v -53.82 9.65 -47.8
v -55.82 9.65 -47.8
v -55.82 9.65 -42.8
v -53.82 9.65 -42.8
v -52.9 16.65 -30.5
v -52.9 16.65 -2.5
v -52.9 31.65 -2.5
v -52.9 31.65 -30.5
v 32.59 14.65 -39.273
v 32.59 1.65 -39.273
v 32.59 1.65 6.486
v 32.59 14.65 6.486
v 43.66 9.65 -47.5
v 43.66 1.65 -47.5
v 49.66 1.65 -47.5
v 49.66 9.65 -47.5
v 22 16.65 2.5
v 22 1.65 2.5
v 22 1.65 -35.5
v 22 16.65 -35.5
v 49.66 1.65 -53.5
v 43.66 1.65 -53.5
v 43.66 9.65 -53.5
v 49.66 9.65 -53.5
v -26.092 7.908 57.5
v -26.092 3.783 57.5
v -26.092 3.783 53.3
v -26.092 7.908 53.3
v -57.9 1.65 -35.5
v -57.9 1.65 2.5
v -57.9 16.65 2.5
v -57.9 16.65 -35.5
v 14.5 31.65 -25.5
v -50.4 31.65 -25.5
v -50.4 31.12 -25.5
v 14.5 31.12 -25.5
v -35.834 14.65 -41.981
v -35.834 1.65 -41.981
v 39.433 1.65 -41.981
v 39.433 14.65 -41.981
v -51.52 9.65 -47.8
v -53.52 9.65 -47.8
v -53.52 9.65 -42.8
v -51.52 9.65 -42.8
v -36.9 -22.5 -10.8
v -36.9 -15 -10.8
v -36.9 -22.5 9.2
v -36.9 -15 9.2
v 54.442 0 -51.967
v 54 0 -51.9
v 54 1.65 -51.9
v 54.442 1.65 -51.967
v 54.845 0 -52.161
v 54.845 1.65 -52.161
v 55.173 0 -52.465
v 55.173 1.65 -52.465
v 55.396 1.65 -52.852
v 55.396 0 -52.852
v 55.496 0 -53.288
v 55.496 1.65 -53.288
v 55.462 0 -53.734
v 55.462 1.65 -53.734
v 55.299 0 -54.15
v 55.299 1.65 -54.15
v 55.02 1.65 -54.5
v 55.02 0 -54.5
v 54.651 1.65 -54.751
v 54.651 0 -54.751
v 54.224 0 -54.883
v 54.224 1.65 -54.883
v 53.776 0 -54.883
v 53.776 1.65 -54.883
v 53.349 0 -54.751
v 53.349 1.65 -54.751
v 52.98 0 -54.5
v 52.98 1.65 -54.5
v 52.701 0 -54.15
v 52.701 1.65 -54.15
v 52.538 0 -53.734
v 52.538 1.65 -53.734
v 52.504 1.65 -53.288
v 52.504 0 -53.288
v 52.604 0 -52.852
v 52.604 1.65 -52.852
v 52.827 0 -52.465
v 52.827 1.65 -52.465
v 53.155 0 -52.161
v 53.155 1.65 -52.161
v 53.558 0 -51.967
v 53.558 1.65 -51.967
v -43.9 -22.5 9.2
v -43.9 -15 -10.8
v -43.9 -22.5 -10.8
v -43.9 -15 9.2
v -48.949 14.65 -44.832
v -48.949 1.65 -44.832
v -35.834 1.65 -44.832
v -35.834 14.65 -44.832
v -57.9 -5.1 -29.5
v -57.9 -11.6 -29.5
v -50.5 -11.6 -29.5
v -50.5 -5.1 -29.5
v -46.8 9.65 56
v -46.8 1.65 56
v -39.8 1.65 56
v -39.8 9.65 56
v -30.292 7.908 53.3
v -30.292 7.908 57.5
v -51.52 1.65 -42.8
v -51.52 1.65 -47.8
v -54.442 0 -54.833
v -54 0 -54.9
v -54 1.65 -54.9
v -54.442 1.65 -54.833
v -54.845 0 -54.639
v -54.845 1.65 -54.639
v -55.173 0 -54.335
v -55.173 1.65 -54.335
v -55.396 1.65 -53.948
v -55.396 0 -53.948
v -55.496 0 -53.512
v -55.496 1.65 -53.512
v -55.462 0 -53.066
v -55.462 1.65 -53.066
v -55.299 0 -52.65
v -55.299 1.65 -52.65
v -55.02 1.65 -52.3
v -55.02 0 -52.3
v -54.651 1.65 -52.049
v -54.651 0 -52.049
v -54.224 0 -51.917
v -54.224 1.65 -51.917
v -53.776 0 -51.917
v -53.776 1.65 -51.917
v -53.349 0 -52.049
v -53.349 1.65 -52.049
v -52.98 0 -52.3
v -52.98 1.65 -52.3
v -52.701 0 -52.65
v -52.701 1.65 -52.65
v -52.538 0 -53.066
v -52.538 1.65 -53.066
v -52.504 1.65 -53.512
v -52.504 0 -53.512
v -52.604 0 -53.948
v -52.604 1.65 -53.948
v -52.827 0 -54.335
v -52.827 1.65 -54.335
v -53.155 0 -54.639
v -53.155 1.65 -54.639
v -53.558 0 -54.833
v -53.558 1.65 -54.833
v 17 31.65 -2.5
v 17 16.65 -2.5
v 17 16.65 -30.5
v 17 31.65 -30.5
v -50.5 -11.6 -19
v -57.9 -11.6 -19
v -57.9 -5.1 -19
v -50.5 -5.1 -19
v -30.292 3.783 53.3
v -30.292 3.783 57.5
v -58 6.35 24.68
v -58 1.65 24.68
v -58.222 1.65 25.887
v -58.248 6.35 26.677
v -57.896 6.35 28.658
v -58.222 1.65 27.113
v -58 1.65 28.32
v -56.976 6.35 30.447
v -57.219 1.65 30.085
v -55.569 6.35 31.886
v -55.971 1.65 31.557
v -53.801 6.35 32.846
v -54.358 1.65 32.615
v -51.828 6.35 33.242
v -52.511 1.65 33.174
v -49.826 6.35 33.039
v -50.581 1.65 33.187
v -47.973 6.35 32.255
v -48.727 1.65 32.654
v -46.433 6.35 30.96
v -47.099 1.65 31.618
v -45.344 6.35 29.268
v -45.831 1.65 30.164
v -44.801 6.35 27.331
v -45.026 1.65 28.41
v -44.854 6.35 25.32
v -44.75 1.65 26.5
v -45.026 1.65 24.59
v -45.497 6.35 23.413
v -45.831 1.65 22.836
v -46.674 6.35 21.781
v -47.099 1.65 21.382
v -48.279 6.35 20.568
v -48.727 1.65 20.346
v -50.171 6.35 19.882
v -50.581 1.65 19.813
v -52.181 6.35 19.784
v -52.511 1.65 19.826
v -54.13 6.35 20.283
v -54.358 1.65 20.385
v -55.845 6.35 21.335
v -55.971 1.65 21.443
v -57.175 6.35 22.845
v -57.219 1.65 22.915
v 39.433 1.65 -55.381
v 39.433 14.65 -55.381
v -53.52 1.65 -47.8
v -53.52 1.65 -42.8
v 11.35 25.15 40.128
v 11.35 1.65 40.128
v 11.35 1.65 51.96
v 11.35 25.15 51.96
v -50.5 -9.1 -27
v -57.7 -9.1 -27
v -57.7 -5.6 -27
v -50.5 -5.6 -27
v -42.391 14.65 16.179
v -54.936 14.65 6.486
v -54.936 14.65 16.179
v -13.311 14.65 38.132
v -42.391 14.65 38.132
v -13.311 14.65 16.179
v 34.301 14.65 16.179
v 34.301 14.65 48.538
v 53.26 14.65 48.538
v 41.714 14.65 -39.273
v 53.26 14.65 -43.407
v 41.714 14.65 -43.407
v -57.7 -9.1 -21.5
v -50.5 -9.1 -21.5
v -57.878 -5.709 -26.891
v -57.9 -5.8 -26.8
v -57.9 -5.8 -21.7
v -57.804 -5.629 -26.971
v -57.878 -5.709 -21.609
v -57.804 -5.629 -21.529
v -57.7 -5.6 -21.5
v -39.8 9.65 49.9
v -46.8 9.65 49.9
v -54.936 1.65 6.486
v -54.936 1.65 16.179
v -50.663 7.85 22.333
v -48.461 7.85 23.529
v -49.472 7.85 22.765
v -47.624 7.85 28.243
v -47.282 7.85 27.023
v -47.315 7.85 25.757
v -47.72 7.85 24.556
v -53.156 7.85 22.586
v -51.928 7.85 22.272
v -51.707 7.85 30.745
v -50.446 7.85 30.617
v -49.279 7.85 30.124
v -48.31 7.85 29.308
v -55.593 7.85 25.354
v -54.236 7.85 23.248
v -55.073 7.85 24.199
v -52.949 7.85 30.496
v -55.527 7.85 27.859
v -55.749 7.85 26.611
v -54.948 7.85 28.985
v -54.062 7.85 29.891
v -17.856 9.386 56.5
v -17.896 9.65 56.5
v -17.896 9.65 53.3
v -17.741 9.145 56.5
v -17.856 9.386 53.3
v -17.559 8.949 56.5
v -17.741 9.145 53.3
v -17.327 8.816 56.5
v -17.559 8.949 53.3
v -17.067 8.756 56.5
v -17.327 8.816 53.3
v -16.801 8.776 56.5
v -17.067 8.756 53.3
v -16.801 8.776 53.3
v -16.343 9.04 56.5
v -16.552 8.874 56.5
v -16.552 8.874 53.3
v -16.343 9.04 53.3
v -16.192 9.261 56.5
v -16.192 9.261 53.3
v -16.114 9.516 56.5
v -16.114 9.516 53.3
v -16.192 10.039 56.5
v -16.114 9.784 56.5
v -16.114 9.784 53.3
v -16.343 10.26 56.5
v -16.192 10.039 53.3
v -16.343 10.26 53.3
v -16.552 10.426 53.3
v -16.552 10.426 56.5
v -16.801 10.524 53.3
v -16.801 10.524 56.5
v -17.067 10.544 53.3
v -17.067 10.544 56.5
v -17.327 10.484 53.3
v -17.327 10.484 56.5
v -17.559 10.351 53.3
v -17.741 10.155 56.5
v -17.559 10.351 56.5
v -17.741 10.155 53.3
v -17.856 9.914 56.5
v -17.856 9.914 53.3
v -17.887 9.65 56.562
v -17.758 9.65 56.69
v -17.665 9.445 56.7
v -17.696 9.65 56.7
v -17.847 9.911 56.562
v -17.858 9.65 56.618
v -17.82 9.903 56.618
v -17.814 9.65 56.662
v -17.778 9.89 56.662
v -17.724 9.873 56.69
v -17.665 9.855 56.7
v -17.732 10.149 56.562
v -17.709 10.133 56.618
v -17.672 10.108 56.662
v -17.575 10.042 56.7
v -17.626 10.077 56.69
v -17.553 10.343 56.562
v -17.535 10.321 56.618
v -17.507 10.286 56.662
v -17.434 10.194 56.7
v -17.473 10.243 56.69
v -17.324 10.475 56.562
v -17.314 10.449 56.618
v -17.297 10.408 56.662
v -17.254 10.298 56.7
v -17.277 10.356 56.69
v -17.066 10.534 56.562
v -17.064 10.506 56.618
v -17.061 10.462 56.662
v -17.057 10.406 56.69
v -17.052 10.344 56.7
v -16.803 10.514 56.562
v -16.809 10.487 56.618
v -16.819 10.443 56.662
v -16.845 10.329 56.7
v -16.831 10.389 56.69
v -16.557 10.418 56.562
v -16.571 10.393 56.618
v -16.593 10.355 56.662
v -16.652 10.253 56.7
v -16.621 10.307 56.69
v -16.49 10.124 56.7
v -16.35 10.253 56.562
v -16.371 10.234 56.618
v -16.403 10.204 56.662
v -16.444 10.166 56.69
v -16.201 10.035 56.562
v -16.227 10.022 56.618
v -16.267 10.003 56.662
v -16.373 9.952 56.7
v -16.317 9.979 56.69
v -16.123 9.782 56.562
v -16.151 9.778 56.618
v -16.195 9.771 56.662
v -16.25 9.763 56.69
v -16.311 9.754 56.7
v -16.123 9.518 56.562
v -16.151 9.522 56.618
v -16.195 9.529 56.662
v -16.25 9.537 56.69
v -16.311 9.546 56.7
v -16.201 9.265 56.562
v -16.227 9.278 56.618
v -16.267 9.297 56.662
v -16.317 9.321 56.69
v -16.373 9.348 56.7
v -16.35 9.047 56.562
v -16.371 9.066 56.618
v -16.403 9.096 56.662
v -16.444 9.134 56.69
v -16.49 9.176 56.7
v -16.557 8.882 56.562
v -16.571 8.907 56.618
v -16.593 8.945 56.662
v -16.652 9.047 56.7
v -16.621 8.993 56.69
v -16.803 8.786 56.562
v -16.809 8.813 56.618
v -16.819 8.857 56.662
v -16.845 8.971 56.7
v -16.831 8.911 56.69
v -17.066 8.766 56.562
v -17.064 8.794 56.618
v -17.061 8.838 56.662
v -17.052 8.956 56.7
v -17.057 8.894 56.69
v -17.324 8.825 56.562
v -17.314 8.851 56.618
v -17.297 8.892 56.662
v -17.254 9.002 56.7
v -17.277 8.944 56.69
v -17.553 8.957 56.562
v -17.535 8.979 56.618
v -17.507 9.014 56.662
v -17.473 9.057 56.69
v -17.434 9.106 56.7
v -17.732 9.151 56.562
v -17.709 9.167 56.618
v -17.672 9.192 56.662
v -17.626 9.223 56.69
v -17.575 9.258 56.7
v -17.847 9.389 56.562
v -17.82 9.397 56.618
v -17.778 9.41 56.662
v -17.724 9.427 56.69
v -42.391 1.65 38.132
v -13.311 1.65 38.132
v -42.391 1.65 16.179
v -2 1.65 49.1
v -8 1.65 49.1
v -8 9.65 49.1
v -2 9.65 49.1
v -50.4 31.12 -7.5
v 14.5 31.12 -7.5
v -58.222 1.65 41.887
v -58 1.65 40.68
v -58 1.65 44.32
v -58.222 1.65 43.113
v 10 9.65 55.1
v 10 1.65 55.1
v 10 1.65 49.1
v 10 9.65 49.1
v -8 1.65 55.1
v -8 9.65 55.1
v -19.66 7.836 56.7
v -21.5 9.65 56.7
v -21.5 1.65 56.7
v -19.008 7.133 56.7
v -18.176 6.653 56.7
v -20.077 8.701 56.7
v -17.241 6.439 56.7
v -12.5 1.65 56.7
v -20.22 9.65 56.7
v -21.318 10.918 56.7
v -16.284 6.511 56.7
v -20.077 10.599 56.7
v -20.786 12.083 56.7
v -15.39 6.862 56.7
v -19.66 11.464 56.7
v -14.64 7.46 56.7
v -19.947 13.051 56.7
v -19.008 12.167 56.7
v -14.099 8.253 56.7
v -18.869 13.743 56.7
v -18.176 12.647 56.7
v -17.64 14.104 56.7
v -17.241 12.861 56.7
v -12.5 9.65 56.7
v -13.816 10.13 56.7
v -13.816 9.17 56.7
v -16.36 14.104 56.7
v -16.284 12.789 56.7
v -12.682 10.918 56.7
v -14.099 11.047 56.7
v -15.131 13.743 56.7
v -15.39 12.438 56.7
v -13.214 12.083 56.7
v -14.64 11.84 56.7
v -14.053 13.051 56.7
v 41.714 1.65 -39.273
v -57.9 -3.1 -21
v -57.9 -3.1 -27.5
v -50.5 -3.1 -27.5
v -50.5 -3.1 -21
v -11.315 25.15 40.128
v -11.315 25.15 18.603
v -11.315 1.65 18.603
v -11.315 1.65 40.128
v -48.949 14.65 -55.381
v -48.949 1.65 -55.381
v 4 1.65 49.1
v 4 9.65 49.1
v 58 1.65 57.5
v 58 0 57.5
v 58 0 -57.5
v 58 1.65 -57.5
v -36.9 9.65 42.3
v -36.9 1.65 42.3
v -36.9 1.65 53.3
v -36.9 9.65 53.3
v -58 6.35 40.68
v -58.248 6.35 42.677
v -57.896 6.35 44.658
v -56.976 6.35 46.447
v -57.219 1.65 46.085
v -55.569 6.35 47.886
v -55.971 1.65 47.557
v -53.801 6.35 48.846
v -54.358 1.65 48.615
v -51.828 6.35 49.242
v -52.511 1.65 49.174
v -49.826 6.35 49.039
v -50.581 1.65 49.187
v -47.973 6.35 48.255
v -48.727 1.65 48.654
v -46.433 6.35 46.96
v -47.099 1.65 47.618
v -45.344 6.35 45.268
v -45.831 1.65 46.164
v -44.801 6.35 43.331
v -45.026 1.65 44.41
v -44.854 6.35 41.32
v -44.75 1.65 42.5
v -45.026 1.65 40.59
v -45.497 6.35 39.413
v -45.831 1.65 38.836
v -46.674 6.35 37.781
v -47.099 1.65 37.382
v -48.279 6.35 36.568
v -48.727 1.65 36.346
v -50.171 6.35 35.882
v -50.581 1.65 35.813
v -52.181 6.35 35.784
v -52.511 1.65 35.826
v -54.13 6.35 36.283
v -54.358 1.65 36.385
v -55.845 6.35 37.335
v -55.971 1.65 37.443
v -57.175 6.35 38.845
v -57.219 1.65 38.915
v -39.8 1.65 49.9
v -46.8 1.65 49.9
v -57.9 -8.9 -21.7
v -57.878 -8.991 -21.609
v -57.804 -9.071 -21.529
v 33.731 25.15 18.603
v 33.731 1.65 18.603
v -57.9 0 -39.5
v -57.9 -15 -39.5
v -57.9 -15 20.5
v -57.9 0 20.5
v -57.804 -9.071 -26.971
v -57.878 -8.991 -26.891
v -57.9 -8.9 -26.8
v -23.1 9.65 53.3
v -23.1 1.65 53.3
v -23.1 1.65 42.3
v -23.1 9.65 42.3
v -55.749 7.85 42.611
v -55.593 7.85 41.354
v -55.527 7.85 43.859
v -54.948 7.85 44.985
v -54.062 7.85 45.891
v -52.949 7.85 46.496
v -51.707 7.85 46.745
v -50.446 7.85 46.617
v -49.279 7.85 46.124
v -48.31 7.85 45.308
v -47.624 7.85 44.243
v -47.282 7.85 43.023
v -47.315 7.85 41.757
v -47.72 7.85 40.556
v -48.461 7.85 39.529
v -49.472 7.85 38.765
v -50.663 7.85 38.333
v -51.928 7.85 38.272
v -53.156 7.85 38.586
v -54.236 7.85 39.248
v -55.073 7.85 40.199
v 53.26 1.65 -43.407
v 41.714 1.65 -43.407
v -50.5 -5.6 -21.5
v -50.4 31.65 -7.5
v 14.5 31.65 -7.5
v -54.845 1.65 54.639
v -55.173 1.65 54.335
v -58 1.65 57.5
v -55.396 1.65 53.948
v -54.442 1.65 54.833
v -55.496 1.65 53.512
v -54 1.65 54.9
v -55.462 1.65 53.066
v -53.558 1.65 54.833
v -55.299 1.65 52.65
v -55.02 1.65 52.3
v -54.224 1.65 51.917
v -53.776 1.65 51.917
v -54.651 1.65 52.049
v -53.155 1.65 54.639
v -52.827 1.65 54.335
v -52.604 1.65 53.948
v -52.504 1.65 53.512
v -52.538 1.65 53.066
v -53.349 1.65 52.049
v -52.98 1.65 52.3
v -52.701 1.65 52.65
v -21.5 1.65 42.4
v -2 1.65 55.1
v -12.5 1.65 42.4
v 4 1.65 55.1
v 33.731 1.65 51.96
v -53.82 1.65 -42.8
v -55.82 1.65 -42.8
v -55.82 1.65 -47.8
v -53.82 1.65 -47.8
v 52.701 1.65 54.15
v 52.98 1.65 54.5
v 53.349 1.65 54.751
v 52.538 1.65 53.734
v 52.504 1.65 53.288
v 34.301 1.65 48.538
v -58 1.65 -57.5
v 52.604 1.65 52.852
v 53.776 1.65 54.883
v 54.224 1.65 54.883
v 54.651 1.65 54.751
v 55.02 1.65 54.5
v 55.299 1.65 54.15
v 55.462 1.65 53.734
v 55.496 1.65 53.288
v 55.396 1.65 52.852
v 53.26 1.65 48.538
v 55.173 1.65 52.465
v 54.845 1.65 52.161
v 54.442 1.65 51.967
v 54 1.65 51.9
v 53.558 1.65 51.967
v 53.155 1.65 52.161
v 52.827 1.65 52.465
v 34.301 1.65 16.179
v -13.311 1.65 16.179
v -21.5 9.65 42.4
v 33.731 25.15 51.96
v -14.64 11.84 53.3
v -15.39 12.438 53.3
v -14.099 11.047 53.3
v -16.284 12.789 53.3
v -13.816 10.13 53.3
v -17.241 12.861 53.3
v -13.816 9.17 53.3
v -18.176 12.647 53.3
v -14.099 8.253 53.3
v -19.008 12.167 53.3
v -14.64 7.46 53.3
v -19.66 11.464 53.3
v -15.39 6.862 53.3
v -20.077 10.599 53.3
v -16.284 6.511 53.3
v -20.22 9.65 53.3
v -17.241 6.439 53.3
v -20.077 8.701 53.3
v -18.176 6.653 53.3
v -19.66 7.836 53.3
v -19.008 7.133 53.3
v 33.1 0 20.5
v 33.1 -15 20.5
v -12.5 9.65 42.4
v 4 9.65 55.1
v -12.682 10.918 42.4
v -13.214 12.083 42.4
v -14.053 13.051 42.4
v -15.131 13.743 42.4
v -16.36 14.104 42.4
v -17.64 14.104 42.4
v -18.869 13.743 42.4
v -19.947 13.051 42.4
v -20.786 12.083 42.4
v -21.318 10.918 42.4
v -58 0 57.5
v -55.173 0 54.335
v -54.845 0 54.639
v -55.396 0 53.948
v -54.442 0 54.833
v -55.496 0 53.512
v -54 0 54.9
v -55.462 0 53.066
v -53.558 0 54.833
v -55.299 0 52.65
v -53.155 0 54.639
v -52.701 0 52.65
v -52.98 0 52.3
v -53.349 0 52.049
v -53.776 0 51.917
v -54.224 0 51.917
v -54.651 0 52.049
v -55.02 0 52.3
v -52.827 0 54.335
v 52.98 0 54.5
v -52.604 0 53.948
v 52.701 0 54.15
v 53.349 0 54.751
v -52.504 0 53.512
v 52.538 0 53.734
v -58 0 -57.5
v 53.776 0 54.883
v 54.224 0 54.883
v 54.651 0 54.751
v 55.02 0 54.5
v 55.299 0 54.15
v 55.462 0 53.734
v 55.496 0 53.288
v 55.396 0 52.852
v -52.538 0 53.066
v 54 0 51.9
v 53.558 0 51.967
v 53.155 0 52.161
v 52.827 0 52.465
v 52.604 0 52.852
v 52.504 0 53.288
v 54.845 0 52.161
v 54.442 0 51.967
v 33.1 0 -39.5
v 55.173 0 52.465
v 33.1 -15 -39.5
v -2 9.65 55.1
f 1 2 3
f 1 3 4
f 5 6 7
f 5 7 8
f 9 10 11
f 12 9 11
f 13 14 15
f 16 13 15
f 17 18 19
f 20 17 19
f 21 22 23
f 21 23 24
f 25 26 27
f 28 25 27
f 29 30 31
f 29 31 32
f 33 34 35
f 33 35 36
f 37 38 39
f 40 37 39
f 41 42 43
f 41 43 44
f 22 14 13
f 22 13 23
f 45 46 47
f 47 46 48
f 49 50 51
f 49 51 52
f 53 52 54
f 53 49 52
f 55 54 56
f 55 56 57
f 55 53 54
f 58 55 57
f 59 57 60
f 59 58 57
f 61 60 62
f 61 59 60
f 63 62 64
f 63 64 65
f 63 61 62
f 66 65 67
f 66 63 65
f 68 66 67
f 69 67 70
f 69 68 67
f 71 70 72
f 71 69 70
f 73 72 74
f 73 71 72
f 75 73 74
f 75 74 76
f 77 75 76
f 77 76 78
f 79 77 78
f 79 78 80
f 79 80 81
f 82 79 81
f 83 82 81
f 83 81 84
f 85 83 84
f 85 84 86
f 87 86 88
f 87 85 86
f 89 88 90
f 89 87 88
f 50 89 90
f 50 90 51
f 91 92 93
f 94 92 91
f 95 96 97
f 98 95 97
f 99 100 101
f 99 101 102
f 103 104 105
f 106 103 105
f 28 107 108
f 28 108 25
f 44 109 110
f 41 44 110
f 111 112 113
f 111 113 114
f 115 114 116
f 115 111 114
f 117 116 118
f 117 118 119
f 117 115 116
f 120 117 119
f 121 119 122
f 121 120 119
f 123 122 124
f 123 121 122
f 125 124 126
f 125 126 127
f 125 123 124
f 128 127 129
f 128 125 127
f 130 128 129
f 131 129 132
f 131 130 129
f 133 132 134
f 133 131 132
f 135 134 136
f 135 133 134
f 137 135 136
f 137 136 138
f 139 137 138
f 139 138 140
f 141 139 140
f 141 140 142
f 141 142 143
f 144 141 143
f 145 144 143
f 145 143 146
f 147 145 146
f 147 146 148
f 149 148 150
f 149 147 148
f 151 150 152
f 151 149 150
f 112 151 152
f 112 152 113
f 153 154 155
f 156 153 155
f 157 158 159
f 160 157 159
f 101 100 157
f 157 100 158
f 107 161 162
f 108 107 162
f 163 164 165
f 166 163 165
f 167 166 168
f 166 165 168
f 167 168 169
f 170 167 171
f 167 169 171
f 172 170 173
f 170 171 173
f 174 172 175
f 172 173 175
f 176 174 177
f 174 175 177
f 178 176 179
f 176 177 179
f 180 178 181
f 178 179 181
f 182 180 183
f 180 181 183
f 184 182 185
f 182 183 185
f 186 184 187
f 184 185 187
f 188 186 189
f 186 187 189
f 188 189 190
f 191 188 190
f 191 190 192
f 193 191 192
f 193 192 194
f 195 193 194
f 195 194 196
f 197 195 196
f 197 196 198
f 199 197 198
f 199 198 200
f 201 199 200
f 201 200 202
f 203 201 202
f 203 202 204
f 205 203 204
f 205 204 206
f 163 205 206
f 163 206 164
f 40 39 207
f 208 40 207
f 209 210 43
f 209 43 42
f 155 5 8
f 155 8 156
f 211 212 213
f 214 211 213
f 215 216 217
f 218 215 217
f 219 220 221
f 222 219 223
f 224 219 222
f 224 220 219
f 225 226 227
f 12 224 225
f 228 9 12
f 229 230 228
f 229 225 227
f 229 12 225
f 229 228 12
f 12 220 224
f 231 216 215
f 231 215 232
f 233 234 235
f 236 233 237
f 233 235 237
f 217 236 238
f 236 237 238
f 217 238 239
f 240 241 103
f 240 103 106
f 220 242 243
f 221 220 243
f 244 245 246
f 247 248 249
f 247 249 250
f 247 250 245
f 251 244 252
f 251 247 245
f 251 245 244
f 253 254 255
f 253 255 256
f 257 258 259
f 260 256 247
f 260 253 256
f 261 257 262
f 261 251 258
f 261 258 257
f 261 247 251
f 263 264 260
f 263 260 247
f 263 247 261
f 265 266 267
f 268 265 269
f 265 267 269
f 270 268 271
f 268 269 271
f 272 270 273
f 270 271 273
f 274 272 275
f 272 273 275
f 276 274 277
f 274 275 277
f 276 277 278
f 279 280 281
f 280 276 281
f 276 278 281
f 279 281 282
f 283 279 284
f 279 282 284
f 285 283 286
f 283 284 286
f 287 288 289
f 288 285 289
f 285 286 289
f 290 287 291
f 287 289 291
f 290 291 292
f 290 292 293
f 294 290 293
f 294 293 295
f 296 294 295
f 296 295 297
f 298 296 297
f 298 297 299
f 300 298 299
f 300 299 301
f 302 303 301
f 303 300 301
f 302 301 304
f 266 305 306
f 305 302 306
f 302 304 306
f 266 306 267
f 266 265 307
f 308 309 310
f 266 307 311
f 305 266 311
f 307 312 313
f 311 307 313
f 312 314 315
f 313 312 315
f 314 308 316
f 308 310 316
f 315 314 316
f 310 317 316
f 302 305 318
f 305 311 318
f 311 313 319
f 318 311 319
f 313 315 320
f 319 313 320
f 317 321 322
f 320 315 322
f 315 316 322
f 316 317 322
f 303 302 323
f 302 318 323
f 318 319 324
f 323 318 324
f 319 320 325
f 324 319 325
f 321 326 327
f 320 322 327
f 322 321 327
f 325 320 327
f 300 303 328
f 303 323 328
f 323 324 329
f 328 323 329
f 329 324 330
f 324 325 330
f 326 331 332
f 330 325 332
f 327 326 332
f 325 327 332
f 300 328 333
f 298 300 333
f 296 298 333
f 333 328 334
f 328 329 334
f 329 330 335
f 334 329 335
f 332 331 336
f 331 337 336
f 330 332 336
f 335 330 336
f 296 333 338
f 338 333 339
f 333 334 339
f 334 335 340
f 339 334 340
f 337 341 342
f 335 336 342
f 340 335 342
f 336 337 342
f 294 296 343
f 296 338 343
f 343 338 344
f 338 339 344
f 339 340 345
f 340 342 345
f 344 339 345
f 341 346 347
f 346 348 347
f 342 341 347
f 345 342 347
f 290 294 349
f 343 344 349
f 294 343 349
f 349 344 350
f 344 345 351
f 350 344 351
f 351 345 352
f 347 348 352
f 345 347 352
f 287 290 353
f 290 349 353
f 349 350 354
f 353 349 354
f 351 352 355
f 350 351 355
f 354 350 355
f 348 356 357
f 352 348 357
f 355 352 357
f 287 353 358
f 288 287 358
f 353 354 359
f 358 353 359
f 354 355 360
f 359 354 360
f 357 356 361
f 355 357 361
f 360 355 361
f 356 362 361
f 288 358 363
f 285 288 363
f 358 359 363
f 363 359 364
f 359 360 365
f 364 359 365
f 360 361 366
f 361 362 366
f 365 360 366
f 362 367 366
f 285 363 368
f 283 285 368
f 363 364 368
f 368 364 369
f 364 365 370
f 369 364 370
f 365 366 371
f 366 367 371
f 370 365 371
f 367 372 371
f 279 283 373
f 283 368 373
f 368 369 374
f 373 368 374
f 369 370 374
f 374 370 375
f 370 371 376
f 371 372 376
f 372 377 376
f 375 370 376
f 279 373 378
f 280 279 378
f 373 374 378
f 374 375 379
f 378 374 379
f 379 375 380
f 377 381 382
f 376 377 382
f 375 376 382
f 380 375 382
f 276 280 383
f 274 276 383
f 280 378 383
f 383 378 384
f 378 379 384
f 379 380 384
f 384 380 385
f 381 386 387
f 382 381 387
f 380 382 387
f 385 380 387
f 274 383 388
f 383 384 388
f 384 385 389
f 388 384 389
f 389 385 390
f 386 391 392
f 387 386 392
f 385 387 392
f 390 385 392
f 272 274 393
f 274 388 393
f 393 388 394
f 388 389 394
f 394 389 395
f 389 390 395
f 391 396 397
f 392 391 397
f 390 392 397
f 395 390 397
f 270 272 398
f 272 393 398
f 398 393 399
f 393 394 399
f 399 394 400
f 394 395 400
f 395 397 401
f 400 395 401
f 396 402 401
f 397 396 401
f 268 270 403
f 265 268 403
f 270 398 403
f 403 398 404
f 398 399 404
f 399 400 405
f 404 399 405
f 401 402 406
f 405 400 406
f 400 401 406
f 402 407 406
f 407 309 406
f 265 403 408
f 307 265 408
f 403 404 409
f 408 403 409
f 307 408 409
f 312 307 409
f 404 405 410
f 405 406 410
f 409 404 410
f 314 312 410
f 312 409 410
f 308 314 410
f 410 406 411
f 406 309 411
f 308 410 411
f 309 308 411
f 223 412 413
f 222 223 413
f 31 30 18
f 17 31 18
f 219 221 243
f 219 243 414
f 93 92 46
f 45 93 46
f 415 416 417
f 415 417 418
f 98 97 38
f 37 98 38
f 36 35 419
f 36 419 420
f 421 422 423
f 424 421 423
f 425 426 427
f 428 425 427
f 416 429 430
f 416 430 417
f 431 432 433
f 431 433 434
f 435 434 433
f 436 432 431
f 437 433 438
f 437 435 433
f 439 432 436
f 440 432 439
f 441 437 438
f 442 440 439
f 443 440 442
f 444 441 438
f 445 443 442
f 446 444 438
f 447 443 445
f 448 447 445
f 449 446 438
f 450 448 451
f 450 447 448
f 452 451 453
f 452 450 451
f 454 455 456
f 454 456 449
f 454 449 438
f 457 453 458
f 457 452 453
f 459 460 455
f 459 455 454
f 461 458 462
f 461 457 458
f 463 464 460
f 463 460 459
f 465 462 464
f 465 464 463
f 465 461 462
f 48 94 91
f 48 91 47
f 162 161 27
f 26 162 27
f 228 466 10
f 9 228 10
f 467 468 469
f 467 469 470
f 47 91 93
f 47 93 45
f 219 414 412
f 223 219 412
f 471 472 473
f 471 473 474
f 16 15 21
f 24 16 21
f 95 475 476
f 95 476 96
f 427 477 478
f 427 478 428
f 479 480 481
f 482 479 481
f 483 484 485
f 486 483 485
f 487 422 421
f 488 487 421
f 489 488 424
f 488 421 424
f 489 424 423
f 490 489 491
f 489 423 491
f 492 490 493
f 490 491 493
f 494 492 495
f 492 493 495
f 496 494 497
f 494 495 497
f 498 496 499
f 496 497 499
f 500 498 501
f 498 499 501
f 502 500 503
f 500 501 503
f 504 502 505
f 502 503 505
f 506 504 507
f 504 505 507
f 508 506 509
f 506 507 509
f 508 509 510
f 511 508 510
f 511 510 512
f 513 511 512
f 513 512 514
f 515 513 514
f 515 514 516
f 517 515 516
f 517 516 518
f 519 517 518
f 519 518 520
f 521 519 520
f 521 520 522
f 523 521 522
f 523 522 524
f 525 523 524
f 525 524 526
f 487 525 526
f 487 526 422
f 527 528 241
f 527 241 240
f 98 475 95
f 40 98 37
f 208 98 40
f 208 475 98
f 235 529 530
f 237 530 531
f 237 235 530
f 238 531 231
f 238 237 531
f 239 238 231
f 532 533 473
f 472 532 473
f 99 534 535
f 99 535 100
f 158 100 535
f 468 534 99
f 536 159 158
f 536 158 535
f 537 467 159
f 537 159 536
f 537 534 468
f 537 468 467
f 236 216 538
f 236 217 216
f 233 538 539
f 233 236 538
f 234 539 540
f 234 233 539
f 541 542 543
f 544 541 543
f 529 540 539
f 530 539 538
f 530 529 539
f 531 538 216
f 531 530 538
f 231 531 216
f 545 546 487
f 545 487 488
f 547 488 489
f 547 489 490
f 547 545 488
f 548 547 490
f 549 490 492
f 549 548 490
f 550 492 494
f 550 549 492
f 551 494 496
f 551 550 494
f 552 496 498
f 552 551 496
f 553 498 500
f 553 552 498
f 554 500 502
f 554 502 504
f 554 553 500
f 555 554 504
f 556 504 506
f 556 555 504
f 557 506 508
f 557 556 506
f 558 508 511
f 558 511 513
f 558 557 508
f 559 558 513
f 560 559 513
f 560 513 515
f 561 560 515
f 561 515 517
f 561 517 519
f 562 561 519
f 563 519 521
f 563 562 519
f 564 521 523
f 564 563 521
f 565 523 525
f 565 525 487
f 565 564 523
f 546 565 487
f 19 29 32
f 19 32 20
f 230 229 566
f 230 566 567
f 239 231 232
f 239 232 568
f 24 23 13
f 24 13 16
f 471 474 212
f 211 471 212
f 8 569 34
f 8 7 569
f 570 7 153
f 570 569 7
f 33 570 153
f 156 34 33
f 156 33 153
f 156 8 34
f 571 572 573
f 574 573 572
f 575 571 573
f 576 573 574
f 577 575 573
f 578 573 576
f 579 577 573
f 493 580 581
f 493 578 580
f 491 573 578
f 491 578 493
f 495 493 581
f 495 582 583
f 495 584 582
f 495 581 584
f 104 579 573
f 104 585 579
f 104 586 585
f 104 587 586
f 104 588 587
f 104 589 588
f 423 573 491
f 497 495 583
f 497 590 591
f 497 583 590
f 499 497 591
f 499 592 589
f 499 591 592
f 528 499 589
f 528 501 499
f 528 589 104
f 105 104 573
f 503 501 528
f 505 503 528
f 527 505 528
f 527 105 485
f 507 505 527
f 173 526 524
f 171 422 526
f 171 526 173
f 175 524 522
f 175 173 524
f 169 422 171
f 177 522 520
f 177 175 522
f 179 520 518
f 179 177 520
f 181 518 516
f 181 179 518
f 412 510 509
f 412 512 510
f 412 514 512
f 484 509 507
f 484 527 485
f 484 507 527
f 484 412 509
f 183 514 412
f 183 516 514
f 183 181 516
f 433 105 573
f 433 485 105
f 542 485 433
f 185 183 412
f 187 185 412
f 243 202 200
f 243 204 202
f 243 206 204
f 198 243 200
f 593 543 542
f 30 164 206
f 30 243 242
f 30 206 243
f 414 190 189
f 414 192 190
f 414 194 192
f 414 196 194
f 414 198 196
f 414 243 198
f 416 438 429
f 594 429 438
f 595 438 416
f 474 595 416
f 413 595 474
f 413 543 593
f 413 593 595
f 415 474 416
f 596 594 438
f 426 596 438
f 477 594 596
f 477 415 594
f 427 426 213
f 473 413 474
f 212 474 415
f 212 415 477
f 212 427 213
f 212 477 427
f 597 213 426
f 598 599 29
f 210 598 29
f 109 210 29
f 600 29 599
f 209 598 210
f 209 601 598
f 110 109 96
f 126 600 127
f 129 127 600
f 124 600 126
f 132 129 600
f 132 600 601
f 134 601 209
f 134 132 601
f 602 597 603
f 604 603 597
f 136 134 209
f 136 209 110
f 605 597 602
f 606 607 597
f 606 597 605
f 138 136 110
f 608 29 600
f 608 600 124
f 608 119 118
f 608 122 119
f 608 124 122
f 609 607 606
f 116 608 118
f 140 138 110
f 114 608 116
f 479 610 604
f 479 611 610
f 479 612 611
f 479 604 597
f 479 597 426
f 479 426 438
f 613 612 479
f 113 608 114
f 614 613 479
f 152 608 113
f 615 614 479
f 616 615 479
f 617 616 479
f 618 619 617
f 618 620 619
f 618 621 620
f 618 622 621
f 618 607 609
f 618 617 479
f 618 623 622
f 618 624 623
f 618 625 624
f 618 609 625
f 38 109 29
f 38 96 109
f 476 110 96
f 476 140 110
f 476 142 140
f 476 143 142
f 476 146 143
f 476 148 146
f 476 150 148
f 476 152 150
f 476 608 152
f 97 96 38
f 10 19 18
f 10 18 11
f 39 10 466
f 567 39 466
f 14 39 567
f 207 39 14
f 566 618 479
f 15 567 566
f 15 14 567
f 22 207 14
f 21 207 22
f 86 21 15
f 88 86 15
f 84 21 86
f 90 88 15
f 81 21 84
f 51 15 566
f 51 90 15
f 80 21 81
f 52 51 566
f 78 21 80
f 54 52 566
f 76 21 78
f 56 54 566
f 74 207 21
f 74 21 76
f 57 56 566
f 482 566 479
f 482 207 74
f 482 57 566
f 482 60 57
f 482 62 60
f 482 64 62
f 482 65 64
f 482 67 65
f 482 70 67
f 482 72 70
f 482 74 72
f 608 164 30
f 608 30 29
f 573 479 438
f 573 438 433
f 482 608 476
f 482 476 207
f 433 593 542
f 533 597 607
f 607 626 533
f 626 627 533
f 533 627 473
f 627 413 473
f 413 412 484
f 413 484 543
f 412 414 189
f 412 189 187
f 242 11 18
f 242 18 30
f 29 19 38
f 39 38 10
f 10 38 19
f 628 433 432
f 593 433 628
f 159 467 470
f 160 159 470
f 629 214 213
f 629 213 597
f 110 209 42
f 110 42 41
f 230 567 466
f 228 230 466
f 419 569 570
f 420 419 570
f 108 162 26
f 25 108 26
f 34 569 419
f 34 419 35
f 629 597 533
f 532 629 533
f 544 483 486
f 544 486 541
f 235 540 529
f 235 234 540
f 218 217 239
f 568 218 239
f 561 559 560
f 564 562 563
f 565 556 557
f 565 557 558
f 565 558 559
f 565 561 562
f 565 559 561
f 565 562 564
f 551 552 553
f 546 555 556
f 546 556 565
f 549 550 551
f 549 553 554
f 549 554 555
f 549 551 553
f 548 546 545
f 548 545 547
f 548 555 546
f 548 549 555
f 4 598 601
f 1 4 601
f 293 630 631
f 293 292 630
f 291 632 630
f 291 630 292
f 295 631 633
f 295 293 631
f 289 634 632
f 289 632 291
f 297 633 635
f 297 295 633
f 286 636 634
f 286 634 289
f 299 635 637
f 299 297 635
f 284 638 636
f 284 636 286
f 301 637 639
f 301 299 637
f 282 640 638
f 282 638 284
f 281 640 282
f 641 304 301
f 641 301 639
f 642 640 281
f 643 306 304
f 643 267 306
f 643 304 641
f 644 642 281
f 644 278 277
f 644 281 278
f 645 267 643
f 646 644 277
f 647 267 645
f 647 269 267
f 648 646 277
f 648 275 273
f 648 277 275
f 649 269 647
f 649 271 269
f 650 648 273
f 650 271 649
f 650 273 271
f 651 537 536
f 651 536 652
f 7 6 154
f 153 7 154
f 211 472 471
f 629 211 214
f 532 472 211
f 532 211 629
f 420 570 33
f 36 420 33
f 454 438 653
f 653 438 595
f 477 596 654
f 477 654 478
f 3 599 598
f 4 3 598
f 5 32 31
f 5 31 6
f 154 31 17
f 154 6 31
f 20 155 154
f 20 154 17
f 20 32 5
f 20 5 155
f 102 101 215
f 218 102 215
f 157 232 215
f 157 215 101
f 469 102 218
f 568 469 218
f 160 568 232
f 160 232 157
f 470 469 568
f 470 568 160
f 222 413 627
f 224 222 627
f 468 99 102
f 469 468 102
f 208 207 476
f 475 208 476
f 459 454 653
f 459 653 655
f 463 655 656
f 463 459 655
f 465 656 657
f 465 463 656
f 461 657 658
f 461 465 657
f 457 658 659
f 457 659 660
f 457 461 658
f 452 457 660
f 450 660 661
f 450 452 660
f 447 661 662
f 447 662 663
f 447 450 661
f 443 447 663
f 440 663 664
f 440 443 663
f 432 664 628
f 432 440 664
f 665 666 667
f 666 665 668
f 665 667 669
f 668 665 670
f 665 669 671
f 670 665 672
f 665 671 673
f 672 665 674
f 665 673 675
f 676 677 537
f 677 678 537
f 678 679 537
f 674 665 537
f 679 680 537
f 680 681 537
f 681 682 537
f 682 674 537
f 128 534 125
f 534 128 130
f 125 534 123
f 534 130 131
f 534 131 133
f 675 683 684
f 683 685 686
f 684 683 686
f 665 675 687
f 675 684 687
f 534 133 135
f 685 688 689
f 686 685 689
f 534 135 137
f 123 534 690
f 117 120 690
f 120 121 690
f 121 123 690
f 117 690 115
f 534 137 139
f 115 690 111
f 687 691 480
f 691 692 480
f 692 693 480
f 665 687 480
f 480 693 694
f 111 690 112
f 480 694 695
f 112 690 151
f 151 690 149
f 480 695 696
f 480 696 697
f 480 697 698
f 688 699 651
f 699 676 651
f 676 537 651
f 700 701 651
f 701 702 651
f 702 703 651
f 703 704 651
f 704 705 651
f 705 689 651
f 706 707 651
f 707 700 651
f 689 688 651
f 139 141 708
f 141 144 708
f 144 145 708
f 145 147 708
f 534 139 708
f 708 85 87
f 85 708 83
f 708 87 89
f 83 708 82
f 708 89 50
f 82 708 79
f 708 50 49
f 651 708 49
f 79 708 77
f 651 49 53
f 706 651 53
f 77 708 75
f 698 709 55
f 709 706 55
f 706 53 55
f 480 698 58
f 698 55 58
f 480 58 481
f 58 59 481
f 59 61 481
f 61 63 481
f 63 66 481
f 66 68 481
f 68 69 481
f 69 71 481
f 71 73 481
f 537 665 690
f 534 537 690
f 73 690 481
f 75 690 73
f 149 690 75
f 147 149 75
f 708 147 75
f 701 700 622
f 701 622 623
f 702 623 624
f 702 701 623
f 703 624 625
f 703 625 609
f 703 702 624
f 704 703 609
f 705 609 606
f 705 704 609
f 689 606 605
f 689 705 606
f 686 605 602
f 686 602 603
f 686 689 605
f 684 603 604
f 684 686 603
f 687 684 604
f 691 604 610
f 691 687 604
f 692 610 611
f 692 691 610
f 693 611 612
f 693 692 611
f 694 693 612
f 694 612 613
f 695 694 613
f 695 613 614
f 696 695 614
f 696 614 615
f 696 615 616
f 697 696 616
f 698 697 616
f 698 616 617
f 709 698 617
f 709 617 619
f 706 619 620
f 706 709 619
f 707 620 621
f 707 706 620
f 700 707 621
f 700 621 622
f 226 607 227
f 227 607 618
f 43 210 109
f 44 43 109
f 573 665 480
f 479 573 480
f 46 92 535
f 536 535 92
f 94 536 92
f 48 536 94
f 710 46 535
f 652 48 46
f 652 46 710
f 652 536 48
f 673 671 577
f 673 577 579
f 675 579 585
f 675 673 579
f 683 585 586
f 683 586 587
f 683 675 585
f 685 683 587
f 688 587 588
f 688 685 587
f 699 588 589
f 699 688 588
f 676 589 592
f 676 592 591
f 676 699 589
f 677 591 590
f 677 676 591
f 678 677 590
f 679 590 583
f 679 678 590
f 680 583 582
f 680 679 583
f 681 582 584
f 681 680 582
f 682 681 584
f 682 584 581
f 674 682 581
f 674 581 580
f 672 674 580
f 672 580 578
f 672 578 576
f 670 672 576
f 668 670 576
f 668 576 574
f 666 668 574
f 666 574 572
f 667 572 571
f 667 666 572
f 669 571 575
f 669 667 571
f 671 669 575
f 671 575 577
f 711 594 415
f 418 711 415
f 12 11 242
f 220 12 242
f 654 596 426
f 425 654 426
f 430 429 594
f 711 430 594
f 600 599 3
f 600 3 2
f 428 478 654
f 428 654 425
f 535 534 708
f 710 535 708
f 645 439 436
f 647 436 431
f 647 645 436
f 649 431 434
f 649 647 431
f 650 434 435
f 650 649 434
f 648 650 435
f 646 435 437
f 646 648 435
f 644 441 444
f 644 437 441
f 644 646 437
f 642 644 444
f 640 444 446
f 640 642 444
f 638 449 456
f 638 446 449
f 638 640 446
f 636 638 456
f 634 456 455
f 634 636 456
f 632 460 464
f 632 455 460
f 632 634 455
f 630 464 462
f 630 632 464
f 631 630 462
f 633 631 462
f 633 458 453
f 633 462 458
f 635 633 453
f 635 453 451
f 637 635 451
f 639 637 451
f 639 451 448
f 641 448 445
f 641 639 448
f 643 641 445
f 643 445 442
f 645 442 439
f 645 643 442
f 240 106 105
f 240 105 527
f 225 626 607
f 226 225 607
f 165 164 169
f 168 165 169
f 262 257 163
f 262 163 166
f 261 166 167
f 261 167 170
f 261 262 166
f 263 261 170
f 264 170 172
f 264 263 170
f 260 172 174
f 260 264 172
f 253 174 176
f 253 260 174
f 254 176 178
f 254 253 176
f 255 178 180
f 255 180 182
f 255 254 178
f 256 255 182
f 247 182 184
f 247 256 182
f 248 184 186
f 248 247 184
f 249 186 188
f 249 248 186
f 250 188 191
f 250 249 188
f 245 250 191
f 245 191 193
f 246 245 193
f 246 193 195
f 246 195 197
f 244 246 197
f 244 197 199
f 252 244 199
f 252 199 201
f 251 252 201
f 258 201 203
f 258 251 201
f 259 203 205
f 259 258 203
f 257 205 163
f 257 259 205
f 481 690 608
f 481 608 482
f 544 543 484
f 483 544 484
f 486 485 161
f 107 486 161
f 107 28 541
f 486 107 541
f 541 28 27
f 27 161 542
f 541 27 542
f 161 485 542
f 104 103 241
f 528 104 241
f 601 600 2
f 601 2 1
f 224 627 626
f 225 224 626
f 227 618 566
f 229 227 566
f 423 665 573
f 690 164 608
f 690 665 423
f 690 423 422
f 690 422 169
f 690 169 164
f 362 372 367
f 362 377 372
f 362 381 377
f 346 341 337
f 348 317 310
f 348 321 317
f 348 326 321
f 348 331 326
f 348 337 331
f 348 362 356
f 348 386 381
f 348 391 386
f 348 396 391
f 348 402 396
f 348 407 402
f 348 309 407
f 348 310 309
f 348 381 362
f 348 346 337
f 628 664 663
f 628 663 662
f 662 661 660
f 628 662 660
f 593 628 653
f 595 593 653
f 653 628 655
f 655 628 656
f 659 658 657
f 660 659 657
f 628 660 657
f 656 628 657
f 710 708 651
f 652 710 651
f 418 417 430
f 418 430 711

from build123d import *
from OCP.BRepFilletAPI import BRepFilletAPI_MakeChamfer

# Parameters (mm, degrees)
SKETCH1_W              = 116
SKETCH1_H              = 115
SKETCH1_R              = 1.5
BASE_FLANGE1_DEPTH     = 1.65
SKETCH3_W              = 79.9
SKETCH3_H              = 38
EXTRUDE1_DEPTH         = 15
SKETCH4_W              = 69.9
SKETCH4_H              = 28
EXTRUDE2_DEPTH         = 15
SKETCH6_W              = 64.9
SKETCH6_H              = 18
DISPLAY_DEPTH          = 0.53
SKETCH7_W              = 91
SKETCH7_H              = 60
WIRING_BOARD_DEPTH     = 15
SKETCH8_W              = 7
SKETCH8_H              = 20
EXTRUDE5_DEPTH         = 7.5
SKETCH9_W              = 10.5
SKETCH9_H              = 8.5
SKETCH9_W_2            = 5.5
SKETCH9_H_2            = 3.5
USB_DEPTH              = 7.5
CHAMFER1_SIZE          = 2
SKETCH10_R             = 6.75
POTENTIOMETERS_DEPTH   = 6.2
SKETCH11_W             = 7
SKETCH11_H             = 6.1
SKETCH11_W_2           = 9
SKETCH11_H_2           = 14.3
SKETCH11_W_3           = 6
SKETCH11_H_3           = 6
SKETCH11_W_4           = 2
SKETCH11_H_4           = 5
KEEP_ACCESSIBLE_DEPTH  = 8
EXTRUDE9_DEPTH         = 13
HOT_VOLTAGE_REGS_DEPTH = 23.5
SKETCH14_R             = 4.5
EXTRUDE10_DEPTH        = 14.3
EXTRUDE11_DEPTH        = 10
EXTRUDE11_DEPTH_BACK   = 3.4
SKETCH15_R             = 3.219788924
SKETCH15_R_2           = 0.896300673
SKETCH15_W             = 5.949829442
SKETCH15_H             = 2.638553101
SKETCH15_H_2           = 2.133019186
FILLET1_R              = 0.2
CHAMFER2_SIZE          = 1.5
CHAMFER2_SIZE2         = 2.5


# Sheet-metal steps are written as plain solids
with BuildPart() as part:
    # Sketch1 → Base-Flange1 (new body)
    with BuildSketch(Plane(origin=(0, 0, 0), x_dir=(1, 0, 0), z_dir=(0, 1, 0))):
        Rectangle(SKETCH1_W, SKETCH1_H)
        with Locations(Location((54, 53.4, 0), (0, 0, 270))):
            Circle(SKETCH1_R, mode=Mode.SUBTRACT)
        with Locations(Location((54, -53.4, 0), (0, 0, 90))):
            Circle(SKETCH1_R, mode=Mode.SUBTRACT)
        with Locations(Location((-54, 53.4, 0), (0, 0, 90))):
            Circle(SKETCH1_R, mode=Mode.SUBTRACT)
        with Locations(Location((-54, -53.4, 0), (0, 0, 270))):
            Circle(SKETCH1_R, mode=Mode.SUBTRACT)
    extrude(amount=BASE_FLANGE1_DEPTH)

    # Sketch3 → Extrude1 (add)
    with BuildSketch(Plane(origin=(0, 1.65, 0), x_dir=(1, 0, 0), z_dir=(0, 1, 0))):
        with Locations((-17.95, 16.5)):
            Rectangle(SKETCH3_W, SKETCH3_H)
    extrude(amount=EXTRUDE1_DEPTH)

    # Sketch4 → Extrude2 (add)
    with BuildSketch(Plane(origin=(0, 16.65, 0), x_dir=(1, 0, 0), z_dir=(0, 1, 0))):
        with Locations((-17.95, 16.5)):
            Rectangle(SKETCH4_W, SKETCH4_H)
    extrude(amount=EXTRUDE2_DEPTH)

    # Sketch6 → Display! (cut)
    with BuildSketch(Plane(origin=(0, 31.65, 0), x_dir=(1, 0, 0), z_dir=(0, 1, 0))):
        with Locations((-17.95, 16.5)):
            Rectangle(SKETCH6_W, SKETCH6_H)
    extrude(amount=-DISPLAY_DEPTH, mode=Mode.SUBTRACT)

    # Sketch7 → Wiring Board (add)
    with BuildSketch(Plane.XZ):
        with Locations((-12.4, -9.5)):
            Rectangle(SKETCH7_W, SKETCH7_H)
    extrude(amount=WIRING_BOARD_DEPTH)

    # Sketch8 → Extrude5 (add)
    with BuildSketch(Plane.XZ.offset(15)):
        with Locations((-40.4, -0.8)):
            Rectangle(SKETCH8_W, SKETCH8_H)
    extrude(amount=EXTRUDE5_DEPTH)

    # Sketch9 → USB (cut)
    with BuildSketch(Plane.ZY.offset(58)):
        with Locations((-24.25, -7.35)):
            Rectangle(SKETCH9_W, SKETCH9_H)
        with Locations((-24.25, -7.35)):
            Rectangle(SKETCH9_W_2, SKETCH9_H_2, mode=Mode.SUBTRACT)
    extrude(amount=-USB_DEPTH, mode=Mode.SUBTRACT)

    # Chamfer1
    chamfer1_edges = [part.edges().sort_by_distance(p)[0] for p in [
        (-54.2, -3.1, -19),
        (-54.2, -3.1, -29.5),
    ]]
    chamfer(chamfer1_edges, length=CHAMFER1_SIZE)

    # Sketch10 → Potentiometers (add)
    with BuildSketch(Plane(origin=(0, 1.65, 0), x_dir=(1, 0, 0), z_dir=(0, 1, 0))):
        with Locations(Location((-51.5, -26.5, 0), (0, 0, 164.357528987))):
            Circle(SKETCH10_R)
        with Locations(Location((-51.5, -42.5, 0), (0, 0, 164.357528987))):
            Circle(SKETCH10_R)
    extrude(amount=POTENTIOMETERS_DEPTH)

    # Sketch11 → Keep Accessible!! (add)
    with BuildSketch(Plane(origin=(0, 1.65, 0), x_dir=(1, 0, 0), z_dir=(0, 1, 0))):
        Polygon((-26.092034571, -53.3), (-23.1, -53.3), (-23.1, -42.3), (-36.9, -42.3), (-36.9, -53.3), (-30.292034571, -53.3), (-30.292034571, -57.5), (-26.092034571, -57.5), align=None)
        with Locations((-43.3, -52.95)):
            Rectangle(SKETCH11_W, SKETCH11_H)
        with Locations((-17, -49.55)):
            Rectangle(SKETCH11_W_2, SKETCH11_H_2)
        with Locations((-5, -52.1)):
            Rectangle(SKETCH11_W_3, SKETCH11_H_3)
        with Locations((7, -52.1)):
            Rectangle(SKETCH11_W_3, SKETCH11_H_3)
        with Locations((46.66, 50.5)):
            Rectangle(SKETCH11_W_3, SKETCH11_H_3)
        with Locations((-54.82, 45.3)):
            Rectangle(SKETCH11_W_4, SKETCH11_H_4)
        with Locations((-52.52, 45.3)):
            Rectangle(SKETCH11_W_4, SKETCH11_H_4)
    extrude(amount=KEEP_ACCESSIBLE_DEPTH)

    # Sketch12 → Extrude9 (add)
    with BuildSketch(Plane(origin=(0, 1.65, 0), x_dir=(1, 0, 0), z_dir=(0, 1, 0))):
        Polygon((-48.948570669, 53.670290093), (-48.948570669, 44.832154672), (-35.833918109, 44.832154672), (-35.833918109, 41.981143246), (37.294524965, 41.981143246), (39.432783534, 41.981143246), (39.432783534, 53.670290093), (39.432783534, 55.380896948), (-48.948570669, 55.380896948), align=None)
        Polygon((41.713592675, 43.406648959), (41.713592675, 39.272682392), (32.590356112, 39.272682392), (32.590356112, -6.486050994), (-54.935694663, -6.486050994), (-54.935694663, -16.179489842), (-42.391244389, -16.179489842), (-42.391244389, -38.132277821), (-13.310927845, -38.132277821), (-13.310927845, -16.179489842), (34.300962968, -16.179489842), (34.300962968, -48.538469526), (53.26018895, -48.538469526), (53.26018895, 43.406648959), align=None)
    extrude(amount=EXTRUDE9_DEPTH)

    # Sketch13 → Hot! Voltage Regs (add)
    with BuildSketch(Plane(origin=(0, 1.65, 0), x_dir=(1, 0, 0), z_dir=(0, 1, 0))):
        Polygon((-11.315219847, -18.602849554), (-11.315219847, -40.12798582), (11.350320989, -40.12798582), (11.350320989, -51.959683237), (33.730760683, -51.959683237), (33.730760683, -18.602849554), align=None)
    extrude(amount=HOT_VOLTAGE_REGS_DEPTH)

    # Sketch14 → Extrude10 (add)
    with BuildSketch(Plane.XY.offset(56.7)):
        with Locations((-17, 9.65)):
            Circle(SKETCH14_R)
    extrude(amount=-EXTRUDE10_DEPTH)

    # Sketch15 → Extrude11 (cut, two sides: drawn at the far end of the back side and taken through both)
    # profile 1 of 3: a face of its own
    with BuildSketch(Plane.XY.offset(56.7).offset(-EXTRUDE11_DEPTH_BACK)):
        with Locations(Location((-17, 9.65, 0), (0, 0, 180))):
            Circle(SKETCH15_R)
        with Locations(Location((-17, 9.65, 0), (0, 0, 180))):
            Circle(SKETCH15_R_2, mode=Mode.SUBTRACT)
    # profile 2 of 3: a face of its own
    with BuildSketch(Plane.XY.offset(56.7).offset(-EXTRUDE11_DEPTH_BACK)):
        with Locations((-28.188847243, 9.227024123)):
            Rectangle(SKETCH15_W, SKETCH15_H)
    # profile 3 of 3: a face of its own
    with BuildSketch(Plane.XY.offset(56.7).offset(-EXTRUDE11_DEPTH_BACK)):
        with Locations((-28.188847243, 2.716509593)):
            Rectangle(SKETCH15_W, SKETCH15_H_2)
    extrude(amount=EXTRUDE11_DEPTH + EXTRUDE11_DEPTH_BACK, mode=Mode.SUBTRACT)

    # Fillet1
    fillet1_edges = [part.edges().sort_by_distance(p)[0] for p in [
        (-16.103699327, 9.65, 56.7),
        (-57.9, -9.1, -24.25),
        (-57.9, -7.35, -21.5),
        (-57.9, -5.6, -24.25),
        (-57.9, -7.35, -27),
    ]]
    fillet(fillet1_edges, radius=FILLET1_R)

    # Chamfer2: one chamfer whose edges measure the first distance from different faces: ONE call of the kernel's chamfer builder (chamfer() names one face for all edges)
    chamfer2_edges_1 = [part.edges().sort_by_distance(p)[0] for p in [
        (-45, 7.85, 28.320027472),
    ]]
    chamfer2_side_1 = [part.faces().sort_by_distance(p)[0] for p in [
        (-45, 4.75, 28.320027472),
    ]]
    chamfer2_edges_2 = [part.edges().sort_by_distance(p)[0] for p in [
        (-45, 7.85, 44.320027472),
    ]]
    chamfer2_side_2 = [part.faces().sort_by_distance(p)[0] for p in [
        (-45, 4.75, 44.320027472),
    ]]
    chamfer2 = BRepFilletAPI_MakeChamfer(part.part.solid().wrapped)
    for e in chamfer2_edges_1:
        chamfer2.Add(CHAMFER2_SIZE, CHAMFER2_SIZE2, e.wrapped, chamfer2_side_1[0].wrapped)  # the first distance lies on this face
    for e in chamfer2_edges_2:
        chamfer2.Add(CHAMFER2_SIZE, CHAMFER2_SIZE2, e.wrapped, chamfer2_side_2[0].wrapped)  # the first distance lies on this face
    add(Compound.cast(chamfer2.Shape()), mode=Mode.REPLACE)


solid = part.part
